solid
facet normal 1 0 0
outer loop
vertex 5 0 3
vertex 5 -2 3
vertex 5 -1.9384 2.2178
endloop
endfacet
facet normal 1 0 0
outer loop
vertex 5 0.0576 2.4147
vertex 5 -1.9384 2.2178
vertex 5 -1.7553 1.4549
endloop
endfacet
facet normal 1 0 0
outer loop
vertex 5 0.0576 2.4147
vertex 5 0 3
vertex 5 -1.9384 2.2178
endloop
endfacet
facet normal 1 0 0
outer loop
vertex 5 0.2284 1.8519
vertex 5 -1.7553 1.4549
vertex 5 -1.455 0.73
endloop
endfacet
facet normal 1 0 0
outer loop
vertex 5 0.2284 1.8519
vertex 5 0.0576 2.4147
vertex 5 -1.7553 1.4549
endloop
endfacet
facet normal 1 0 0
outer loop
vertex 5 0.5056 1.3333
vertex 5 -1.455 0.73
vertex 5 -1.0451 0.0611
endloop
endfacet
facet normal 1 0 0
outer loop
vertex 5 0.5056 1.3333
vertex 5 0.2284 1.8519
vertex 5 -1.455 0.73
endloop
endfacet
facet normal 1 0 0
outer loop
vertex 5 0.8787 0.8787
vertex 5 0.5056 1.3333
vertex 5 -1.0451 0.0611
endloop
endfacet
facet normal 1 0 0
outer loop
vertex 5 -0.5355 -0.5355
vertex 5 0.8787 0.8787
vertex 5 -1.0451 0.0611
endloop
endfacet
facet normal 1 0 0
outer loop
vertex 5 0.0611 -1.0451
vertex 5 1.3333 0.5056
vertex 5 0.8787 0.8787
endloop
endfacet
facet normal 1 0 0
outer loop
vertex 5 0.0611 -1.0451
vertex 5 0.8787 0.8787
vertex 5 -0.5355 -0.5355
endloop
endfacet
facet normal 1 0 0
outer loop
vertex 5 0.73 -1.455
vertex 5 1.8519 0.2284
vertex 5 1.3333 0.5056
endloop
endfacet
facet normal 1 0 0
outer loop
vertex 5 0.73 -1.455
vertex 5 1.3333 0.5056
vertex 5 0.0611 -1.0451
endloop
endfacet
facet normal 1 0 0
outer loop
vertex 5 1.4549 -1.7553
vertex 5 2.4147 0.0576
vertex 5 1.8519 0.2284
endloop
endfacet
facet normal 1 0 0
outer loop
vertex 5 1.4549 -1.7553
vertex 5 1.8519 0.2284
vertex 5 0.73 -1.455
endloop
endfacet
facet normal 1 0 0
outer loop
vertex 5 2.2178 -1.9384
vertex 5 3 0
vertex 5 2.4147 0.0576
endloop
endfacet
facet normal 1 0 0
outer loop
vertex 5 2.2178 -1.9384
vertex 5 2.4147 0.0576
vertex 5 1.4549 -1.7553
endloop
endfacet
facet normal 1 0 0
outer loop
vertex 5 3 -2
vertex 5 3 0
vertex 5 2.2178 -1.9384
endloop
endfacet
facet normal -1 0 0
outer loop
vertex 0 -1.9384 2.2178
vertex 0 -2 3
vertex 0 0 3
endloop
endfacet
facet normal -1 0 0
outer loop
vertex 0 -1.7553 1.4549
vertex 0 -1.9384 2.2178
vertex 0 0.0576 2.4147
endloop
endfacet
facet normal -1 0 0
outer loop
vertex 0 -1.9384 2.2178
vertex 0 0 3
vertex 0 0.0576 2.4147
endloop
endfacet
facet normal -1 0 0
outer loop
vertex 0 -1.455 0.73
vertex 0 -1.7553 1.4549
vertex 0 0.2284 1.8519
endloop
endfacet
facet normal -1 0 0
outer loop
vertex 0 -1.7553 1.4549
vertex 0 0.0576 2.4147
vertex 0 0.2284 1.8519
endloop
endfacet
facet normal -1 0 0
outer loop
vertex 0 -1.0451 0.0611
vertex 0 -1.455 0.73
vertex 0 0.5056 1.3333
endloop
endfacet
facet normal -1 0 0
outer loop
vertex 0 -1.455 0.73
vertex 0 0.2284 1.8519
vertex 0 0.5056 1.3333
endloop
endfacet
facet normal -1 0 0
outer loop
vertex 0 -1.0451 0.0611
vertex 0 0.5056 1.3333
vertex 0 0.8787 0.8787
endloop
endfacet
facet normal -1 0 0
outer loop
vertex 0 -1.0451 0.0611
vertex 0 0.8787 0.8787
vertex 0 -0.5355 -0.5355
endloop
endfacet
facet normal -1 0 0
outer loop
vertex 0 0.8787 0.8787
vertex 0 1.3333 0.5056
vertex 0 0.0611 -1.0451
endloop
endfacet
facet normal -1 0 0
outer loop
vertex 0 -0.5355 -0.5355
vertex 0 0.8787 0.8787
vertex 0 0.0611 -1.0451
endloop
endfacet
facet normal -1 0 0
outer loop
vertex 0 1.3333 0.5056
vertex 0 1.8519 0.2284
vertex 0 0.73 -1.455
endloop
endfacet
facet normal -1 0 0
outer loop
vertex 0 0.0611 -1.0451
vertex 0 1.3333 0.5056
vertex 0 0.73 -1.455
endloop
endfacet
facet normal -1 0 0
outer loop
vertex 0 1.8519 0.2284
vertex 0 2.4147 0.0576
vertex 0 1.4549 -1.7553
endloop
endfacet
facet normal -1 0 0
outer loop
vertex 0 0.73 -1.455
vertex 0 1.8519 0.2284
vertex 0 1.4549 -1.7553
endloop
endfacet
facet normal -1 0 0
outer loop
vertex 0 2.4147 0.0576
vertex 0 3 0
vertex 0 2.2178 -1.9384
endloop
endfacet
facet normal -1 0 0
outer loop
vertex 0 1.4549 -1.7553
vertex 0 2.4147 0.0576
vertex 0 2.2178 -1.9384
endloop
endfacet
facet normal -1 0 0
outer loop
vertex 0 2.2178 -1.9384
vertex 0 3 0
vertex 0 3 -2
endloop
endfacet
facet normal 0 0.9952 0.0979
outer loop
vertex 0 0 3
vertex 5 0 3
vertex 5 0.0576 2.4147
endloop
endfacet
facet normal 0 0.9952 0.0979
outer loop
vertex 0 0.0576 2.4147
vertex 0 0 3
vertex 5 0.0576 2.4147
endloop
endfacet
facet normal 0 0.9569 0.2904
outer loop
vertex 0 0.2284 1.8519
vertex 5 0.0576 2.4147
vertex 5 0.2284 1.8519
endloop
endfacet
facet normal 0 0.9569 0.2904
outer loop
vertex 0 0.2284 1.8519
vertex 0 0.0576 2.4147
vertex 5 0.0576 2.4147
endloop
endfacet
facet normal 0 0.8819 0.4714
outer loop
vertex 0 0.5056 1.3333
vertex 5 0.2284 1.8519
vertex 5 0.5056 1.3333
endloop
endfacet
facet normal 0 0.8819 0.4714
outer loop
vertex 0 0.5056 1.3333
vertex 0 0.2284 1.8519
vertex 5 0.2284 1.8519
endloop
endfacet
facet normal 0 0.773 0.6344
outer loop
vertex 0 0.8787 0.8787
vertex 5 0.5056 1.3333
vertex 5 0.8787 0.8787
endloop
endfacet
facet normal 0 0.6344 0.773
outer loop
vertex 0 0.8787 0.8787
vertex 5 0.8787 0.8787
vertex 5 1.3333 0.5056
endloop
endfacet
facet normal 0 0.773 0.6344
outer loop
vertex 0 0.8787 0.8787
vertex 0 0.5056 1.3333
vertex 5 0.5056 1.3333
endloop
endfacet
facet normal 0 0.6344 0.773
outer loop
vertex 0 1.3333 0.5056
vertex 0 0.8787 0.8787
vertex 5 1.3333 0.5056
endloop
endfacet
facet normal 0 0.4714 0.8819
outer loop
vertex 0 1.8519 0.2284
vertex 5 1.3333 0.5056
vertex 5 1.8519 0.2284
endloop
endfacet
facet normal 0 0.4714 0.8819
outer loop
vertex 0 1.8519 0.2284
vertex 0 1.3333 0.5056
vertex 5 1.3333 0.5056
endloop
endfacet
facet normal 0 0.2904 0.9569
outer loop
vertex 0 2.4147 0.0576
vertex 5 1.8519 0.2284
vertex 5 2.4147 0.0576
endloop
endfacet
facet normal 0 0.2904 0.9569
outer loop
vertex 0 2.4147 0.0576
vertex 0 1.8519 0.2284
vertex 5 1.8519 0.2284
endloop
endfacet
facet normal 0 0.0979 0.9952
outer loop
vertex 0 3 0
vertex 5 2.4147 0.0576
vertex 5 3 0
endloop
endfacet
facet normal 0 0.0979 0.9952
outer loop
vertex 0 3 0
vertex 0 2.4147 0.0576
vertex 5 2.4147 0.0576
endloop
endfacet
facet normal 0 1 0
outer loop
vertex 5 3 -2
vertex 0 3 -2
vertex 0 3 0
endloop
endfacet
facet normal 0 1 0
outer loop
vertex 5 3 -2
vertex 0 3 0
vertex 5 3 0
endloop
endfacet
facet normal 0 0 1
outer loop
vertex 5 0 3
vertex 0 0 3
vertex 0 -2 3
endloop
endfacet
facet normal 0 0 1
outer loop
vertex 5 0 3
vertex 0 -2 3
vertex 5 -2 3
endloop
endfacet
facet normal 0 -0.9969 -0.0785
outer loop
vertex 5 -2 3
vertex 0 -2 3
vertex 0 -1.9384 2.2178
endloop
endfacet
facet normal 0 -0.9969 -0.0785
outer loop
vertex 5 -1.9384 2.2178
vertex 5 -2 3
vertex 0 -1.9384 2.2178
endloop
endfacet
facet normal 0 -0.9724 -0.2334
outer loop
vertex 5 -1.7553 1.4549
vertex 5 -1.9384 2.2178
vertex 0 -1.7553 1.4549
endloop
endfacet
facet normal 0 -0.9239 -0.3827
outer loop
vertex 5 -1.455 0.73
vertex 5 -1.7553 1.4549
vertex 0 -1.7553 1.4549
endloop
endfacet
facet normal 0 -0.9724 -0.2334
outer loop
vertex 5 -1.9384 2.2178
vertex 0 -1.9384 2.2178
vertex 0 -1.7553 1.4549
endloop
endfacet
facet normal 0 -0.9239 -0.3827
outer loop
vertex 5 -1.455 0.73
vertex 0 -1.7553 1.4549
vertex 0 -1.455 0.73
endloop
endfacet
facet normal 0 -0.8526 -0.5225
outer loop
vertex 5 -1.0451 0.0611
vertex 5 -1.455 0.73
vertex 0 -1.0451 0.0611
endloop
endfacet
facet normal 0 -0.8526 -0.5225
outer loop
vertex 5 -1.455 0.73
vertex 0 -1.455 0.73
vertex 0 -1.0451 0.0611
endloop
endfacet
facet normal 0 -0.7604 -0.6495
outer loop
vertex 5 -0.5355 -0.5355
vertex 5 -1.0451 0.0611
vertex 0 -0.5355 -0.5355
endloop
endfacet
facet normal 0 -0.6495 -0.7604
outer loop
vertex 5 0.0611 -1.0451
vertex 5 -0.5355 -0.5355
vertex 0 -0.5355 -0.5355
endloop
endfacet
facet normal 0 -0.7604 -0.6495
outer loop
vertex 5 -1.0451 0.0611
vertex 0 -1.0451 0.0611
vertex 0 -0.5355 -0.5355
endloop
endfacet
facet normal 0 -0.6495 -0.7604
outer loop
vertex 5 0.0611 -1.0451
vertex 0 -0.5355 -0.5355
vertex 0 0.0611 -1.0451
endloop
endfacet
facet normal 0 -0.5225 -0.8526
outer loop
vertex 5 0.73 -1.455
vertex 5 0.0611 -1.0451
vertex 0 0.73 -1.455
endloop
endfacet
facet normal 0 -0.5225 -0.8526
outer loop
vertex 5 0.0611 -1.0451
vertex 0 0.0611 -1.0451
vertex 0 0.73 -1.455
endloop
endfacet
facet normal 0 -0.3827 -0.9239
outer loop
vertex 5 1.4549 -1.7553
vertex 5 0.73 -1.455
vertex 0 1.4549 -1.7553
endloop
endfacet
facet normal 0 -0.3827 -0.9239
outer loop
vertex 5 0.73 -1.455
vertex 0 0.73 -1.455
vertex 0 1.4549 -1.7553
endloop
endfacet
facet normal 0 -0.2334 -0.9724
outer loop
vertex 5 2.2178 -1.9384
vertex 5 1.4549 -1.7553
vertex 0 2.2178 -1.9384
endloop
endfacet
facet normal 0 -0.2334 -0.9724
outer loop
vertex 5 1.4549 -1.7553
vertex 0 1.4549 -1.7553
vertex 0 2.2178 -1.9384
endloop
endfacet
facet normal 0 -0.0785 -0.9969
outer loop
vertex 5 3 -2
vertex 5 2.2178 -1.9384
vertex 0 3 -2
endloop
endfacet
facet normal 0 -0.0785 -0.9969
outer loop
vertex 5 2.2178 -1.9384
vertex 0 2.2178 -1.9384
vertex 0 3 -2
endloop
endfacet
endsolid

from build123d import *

# Parameters (mm, degrees)
BOX008_W      = 5
BOX008_H      = 10
BOX008_DEPTH  = 5
BOX007_W      = 5
BOX007_H      = 5
BOX007_DEPTH  = 10
TUBE003_R     = 5
TUBE003_R_2   = 3
TUBE003_DEPTH = 5


with BuildPart() as cube008:
    # Box008 → Box008 (new body)
    with BuildSketch(Plane(origin=(0, -2, 3), x_dir=(1, 0, 0), z_dir=(0, 0, 1))):
        with Locations((2.5, 5)):
            Rectangle(BOX008_W, BOX008_H)
    extrude(amount=BOX008_DEPTH)


with BuildPart() as cube007:
    # Box007 → Box007 (new body)
    with BuildSketch(Plane(origin=(0, 3, -2), x_dir=(1, 0, 0), z_dir=(0, 0, 1))):
        with Locations((2.5, 2.5)):
            Rectangle(BOX007_W, BOX007_H)
    extrude(amount=BOX007_DEPTH)


with BuildPart() as cut007:
    # Tube003 → Tube003 (new body)
    with BuildSketch(Plane(origin=(0, 3, 3), x_dir=(0, 0, -1), z_dir=(1, 0, 0))):
        Circle(TUBE003_R)
        Circle(TUBE003_R_2, mode=Mode.SUBTRACT)
    extrude(amount=TUBE003_DEPTH)

    # Cut006: cut Cube007
    add(cube007.part, mode=Mode.SUBTRACT)

    # Cut007: cut Cube008
    add(cube008.part, mode=Mode.SUBTRACT)


solid = cut007.part
